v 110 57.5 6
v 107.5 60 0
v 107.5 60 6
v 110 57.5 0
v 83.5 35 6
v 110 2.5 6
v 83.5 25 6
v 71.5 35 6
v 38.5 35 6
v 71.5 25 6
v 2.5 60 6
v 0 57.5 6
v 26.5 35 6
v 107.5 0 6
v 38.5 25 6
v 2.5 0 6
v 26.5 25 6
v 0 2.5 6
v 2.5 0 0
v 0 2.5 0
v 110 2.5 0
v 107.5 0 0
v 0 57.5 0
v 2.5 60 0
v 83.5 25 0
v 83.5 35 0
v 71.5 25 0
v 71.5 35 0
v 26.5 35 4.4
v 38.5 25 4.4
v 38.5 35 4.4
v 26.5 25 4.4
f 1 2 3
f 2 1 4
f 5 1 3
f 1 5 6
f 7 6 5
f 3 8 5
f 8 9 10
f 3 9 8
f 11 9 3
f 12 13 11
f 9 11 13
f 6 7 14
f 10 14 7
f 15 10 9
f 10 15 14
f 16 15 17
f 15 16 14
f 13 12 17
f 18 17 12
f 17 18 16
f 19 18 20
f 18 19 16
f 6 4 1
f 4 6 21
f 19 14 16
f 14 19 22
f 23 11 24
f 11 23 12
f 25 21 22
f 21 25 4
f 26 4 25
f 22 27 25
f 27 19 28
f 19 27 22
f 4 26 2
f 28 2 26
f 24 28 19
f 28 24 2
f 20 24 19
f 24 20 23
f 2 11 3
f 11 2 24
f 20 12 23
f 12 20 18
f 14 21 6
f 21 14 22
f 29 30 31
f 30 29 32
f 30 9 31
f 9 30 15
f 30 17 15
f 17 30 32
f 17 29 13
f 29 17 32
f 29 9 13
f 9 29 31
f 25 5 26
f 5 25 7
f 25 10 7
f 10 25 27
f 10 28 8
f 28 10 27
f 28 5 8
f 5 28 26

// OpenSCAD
$fn = 32;

// ----------------------------------------------------------------------
// Windowed plate: 2 voids, 110 x 60 x 6 mm
// ----------------------------------------------------------------------

// --- parameters (mm) ---
plate_l = 110;            // plate length, X
plate_w = 60;             // plate width, Y
plate_t = 6;              // plate thickness, Z
edge_margin = 10;         // wall from the plate edge to any window
windows = 2;              // number of windows in the row
win_l = 12;               // window length
win_w = 10;               // window width
win_pitch = 45;           // window pitch along X
depth_1 = 1.6;            // depth of void 1 (full thickness = through)
depth_2 = 6;              // depth of void 2 (full thickness = through)
corner_c = 2.5;           // corner chamfer of the plate

profile = [[2.5, 0], [107.5, 0], [110, 2.5], [110, 57.5], [107.5, 60], [2.5, 60], [0, 57.5], [0, 2.5]];  // primary outline, 8 points, counter clockwise
void_1 = [[26.5, 25], [38.5, 25], [38.5, 35], [26.5, 35]];  // window 1 of the row, 4 points
void_2 = [[71.5, 25], [83.5, 25], [83.5, 35], [71.5, 35]];  // window 2 of the row, 4 points

// --- the one profile operation ---
difference() {
  linear_extrude(height = plate_t) polygon(points = profile);
  translate([0, 0, plate_t - depth_1])
    linear_extrude(height = depth_1 + 1) polygon(points = void_1);
  translate([0, 0, -1])
    linear_extrude(height = plate_t + 2) polygon(points = void_2);
}
